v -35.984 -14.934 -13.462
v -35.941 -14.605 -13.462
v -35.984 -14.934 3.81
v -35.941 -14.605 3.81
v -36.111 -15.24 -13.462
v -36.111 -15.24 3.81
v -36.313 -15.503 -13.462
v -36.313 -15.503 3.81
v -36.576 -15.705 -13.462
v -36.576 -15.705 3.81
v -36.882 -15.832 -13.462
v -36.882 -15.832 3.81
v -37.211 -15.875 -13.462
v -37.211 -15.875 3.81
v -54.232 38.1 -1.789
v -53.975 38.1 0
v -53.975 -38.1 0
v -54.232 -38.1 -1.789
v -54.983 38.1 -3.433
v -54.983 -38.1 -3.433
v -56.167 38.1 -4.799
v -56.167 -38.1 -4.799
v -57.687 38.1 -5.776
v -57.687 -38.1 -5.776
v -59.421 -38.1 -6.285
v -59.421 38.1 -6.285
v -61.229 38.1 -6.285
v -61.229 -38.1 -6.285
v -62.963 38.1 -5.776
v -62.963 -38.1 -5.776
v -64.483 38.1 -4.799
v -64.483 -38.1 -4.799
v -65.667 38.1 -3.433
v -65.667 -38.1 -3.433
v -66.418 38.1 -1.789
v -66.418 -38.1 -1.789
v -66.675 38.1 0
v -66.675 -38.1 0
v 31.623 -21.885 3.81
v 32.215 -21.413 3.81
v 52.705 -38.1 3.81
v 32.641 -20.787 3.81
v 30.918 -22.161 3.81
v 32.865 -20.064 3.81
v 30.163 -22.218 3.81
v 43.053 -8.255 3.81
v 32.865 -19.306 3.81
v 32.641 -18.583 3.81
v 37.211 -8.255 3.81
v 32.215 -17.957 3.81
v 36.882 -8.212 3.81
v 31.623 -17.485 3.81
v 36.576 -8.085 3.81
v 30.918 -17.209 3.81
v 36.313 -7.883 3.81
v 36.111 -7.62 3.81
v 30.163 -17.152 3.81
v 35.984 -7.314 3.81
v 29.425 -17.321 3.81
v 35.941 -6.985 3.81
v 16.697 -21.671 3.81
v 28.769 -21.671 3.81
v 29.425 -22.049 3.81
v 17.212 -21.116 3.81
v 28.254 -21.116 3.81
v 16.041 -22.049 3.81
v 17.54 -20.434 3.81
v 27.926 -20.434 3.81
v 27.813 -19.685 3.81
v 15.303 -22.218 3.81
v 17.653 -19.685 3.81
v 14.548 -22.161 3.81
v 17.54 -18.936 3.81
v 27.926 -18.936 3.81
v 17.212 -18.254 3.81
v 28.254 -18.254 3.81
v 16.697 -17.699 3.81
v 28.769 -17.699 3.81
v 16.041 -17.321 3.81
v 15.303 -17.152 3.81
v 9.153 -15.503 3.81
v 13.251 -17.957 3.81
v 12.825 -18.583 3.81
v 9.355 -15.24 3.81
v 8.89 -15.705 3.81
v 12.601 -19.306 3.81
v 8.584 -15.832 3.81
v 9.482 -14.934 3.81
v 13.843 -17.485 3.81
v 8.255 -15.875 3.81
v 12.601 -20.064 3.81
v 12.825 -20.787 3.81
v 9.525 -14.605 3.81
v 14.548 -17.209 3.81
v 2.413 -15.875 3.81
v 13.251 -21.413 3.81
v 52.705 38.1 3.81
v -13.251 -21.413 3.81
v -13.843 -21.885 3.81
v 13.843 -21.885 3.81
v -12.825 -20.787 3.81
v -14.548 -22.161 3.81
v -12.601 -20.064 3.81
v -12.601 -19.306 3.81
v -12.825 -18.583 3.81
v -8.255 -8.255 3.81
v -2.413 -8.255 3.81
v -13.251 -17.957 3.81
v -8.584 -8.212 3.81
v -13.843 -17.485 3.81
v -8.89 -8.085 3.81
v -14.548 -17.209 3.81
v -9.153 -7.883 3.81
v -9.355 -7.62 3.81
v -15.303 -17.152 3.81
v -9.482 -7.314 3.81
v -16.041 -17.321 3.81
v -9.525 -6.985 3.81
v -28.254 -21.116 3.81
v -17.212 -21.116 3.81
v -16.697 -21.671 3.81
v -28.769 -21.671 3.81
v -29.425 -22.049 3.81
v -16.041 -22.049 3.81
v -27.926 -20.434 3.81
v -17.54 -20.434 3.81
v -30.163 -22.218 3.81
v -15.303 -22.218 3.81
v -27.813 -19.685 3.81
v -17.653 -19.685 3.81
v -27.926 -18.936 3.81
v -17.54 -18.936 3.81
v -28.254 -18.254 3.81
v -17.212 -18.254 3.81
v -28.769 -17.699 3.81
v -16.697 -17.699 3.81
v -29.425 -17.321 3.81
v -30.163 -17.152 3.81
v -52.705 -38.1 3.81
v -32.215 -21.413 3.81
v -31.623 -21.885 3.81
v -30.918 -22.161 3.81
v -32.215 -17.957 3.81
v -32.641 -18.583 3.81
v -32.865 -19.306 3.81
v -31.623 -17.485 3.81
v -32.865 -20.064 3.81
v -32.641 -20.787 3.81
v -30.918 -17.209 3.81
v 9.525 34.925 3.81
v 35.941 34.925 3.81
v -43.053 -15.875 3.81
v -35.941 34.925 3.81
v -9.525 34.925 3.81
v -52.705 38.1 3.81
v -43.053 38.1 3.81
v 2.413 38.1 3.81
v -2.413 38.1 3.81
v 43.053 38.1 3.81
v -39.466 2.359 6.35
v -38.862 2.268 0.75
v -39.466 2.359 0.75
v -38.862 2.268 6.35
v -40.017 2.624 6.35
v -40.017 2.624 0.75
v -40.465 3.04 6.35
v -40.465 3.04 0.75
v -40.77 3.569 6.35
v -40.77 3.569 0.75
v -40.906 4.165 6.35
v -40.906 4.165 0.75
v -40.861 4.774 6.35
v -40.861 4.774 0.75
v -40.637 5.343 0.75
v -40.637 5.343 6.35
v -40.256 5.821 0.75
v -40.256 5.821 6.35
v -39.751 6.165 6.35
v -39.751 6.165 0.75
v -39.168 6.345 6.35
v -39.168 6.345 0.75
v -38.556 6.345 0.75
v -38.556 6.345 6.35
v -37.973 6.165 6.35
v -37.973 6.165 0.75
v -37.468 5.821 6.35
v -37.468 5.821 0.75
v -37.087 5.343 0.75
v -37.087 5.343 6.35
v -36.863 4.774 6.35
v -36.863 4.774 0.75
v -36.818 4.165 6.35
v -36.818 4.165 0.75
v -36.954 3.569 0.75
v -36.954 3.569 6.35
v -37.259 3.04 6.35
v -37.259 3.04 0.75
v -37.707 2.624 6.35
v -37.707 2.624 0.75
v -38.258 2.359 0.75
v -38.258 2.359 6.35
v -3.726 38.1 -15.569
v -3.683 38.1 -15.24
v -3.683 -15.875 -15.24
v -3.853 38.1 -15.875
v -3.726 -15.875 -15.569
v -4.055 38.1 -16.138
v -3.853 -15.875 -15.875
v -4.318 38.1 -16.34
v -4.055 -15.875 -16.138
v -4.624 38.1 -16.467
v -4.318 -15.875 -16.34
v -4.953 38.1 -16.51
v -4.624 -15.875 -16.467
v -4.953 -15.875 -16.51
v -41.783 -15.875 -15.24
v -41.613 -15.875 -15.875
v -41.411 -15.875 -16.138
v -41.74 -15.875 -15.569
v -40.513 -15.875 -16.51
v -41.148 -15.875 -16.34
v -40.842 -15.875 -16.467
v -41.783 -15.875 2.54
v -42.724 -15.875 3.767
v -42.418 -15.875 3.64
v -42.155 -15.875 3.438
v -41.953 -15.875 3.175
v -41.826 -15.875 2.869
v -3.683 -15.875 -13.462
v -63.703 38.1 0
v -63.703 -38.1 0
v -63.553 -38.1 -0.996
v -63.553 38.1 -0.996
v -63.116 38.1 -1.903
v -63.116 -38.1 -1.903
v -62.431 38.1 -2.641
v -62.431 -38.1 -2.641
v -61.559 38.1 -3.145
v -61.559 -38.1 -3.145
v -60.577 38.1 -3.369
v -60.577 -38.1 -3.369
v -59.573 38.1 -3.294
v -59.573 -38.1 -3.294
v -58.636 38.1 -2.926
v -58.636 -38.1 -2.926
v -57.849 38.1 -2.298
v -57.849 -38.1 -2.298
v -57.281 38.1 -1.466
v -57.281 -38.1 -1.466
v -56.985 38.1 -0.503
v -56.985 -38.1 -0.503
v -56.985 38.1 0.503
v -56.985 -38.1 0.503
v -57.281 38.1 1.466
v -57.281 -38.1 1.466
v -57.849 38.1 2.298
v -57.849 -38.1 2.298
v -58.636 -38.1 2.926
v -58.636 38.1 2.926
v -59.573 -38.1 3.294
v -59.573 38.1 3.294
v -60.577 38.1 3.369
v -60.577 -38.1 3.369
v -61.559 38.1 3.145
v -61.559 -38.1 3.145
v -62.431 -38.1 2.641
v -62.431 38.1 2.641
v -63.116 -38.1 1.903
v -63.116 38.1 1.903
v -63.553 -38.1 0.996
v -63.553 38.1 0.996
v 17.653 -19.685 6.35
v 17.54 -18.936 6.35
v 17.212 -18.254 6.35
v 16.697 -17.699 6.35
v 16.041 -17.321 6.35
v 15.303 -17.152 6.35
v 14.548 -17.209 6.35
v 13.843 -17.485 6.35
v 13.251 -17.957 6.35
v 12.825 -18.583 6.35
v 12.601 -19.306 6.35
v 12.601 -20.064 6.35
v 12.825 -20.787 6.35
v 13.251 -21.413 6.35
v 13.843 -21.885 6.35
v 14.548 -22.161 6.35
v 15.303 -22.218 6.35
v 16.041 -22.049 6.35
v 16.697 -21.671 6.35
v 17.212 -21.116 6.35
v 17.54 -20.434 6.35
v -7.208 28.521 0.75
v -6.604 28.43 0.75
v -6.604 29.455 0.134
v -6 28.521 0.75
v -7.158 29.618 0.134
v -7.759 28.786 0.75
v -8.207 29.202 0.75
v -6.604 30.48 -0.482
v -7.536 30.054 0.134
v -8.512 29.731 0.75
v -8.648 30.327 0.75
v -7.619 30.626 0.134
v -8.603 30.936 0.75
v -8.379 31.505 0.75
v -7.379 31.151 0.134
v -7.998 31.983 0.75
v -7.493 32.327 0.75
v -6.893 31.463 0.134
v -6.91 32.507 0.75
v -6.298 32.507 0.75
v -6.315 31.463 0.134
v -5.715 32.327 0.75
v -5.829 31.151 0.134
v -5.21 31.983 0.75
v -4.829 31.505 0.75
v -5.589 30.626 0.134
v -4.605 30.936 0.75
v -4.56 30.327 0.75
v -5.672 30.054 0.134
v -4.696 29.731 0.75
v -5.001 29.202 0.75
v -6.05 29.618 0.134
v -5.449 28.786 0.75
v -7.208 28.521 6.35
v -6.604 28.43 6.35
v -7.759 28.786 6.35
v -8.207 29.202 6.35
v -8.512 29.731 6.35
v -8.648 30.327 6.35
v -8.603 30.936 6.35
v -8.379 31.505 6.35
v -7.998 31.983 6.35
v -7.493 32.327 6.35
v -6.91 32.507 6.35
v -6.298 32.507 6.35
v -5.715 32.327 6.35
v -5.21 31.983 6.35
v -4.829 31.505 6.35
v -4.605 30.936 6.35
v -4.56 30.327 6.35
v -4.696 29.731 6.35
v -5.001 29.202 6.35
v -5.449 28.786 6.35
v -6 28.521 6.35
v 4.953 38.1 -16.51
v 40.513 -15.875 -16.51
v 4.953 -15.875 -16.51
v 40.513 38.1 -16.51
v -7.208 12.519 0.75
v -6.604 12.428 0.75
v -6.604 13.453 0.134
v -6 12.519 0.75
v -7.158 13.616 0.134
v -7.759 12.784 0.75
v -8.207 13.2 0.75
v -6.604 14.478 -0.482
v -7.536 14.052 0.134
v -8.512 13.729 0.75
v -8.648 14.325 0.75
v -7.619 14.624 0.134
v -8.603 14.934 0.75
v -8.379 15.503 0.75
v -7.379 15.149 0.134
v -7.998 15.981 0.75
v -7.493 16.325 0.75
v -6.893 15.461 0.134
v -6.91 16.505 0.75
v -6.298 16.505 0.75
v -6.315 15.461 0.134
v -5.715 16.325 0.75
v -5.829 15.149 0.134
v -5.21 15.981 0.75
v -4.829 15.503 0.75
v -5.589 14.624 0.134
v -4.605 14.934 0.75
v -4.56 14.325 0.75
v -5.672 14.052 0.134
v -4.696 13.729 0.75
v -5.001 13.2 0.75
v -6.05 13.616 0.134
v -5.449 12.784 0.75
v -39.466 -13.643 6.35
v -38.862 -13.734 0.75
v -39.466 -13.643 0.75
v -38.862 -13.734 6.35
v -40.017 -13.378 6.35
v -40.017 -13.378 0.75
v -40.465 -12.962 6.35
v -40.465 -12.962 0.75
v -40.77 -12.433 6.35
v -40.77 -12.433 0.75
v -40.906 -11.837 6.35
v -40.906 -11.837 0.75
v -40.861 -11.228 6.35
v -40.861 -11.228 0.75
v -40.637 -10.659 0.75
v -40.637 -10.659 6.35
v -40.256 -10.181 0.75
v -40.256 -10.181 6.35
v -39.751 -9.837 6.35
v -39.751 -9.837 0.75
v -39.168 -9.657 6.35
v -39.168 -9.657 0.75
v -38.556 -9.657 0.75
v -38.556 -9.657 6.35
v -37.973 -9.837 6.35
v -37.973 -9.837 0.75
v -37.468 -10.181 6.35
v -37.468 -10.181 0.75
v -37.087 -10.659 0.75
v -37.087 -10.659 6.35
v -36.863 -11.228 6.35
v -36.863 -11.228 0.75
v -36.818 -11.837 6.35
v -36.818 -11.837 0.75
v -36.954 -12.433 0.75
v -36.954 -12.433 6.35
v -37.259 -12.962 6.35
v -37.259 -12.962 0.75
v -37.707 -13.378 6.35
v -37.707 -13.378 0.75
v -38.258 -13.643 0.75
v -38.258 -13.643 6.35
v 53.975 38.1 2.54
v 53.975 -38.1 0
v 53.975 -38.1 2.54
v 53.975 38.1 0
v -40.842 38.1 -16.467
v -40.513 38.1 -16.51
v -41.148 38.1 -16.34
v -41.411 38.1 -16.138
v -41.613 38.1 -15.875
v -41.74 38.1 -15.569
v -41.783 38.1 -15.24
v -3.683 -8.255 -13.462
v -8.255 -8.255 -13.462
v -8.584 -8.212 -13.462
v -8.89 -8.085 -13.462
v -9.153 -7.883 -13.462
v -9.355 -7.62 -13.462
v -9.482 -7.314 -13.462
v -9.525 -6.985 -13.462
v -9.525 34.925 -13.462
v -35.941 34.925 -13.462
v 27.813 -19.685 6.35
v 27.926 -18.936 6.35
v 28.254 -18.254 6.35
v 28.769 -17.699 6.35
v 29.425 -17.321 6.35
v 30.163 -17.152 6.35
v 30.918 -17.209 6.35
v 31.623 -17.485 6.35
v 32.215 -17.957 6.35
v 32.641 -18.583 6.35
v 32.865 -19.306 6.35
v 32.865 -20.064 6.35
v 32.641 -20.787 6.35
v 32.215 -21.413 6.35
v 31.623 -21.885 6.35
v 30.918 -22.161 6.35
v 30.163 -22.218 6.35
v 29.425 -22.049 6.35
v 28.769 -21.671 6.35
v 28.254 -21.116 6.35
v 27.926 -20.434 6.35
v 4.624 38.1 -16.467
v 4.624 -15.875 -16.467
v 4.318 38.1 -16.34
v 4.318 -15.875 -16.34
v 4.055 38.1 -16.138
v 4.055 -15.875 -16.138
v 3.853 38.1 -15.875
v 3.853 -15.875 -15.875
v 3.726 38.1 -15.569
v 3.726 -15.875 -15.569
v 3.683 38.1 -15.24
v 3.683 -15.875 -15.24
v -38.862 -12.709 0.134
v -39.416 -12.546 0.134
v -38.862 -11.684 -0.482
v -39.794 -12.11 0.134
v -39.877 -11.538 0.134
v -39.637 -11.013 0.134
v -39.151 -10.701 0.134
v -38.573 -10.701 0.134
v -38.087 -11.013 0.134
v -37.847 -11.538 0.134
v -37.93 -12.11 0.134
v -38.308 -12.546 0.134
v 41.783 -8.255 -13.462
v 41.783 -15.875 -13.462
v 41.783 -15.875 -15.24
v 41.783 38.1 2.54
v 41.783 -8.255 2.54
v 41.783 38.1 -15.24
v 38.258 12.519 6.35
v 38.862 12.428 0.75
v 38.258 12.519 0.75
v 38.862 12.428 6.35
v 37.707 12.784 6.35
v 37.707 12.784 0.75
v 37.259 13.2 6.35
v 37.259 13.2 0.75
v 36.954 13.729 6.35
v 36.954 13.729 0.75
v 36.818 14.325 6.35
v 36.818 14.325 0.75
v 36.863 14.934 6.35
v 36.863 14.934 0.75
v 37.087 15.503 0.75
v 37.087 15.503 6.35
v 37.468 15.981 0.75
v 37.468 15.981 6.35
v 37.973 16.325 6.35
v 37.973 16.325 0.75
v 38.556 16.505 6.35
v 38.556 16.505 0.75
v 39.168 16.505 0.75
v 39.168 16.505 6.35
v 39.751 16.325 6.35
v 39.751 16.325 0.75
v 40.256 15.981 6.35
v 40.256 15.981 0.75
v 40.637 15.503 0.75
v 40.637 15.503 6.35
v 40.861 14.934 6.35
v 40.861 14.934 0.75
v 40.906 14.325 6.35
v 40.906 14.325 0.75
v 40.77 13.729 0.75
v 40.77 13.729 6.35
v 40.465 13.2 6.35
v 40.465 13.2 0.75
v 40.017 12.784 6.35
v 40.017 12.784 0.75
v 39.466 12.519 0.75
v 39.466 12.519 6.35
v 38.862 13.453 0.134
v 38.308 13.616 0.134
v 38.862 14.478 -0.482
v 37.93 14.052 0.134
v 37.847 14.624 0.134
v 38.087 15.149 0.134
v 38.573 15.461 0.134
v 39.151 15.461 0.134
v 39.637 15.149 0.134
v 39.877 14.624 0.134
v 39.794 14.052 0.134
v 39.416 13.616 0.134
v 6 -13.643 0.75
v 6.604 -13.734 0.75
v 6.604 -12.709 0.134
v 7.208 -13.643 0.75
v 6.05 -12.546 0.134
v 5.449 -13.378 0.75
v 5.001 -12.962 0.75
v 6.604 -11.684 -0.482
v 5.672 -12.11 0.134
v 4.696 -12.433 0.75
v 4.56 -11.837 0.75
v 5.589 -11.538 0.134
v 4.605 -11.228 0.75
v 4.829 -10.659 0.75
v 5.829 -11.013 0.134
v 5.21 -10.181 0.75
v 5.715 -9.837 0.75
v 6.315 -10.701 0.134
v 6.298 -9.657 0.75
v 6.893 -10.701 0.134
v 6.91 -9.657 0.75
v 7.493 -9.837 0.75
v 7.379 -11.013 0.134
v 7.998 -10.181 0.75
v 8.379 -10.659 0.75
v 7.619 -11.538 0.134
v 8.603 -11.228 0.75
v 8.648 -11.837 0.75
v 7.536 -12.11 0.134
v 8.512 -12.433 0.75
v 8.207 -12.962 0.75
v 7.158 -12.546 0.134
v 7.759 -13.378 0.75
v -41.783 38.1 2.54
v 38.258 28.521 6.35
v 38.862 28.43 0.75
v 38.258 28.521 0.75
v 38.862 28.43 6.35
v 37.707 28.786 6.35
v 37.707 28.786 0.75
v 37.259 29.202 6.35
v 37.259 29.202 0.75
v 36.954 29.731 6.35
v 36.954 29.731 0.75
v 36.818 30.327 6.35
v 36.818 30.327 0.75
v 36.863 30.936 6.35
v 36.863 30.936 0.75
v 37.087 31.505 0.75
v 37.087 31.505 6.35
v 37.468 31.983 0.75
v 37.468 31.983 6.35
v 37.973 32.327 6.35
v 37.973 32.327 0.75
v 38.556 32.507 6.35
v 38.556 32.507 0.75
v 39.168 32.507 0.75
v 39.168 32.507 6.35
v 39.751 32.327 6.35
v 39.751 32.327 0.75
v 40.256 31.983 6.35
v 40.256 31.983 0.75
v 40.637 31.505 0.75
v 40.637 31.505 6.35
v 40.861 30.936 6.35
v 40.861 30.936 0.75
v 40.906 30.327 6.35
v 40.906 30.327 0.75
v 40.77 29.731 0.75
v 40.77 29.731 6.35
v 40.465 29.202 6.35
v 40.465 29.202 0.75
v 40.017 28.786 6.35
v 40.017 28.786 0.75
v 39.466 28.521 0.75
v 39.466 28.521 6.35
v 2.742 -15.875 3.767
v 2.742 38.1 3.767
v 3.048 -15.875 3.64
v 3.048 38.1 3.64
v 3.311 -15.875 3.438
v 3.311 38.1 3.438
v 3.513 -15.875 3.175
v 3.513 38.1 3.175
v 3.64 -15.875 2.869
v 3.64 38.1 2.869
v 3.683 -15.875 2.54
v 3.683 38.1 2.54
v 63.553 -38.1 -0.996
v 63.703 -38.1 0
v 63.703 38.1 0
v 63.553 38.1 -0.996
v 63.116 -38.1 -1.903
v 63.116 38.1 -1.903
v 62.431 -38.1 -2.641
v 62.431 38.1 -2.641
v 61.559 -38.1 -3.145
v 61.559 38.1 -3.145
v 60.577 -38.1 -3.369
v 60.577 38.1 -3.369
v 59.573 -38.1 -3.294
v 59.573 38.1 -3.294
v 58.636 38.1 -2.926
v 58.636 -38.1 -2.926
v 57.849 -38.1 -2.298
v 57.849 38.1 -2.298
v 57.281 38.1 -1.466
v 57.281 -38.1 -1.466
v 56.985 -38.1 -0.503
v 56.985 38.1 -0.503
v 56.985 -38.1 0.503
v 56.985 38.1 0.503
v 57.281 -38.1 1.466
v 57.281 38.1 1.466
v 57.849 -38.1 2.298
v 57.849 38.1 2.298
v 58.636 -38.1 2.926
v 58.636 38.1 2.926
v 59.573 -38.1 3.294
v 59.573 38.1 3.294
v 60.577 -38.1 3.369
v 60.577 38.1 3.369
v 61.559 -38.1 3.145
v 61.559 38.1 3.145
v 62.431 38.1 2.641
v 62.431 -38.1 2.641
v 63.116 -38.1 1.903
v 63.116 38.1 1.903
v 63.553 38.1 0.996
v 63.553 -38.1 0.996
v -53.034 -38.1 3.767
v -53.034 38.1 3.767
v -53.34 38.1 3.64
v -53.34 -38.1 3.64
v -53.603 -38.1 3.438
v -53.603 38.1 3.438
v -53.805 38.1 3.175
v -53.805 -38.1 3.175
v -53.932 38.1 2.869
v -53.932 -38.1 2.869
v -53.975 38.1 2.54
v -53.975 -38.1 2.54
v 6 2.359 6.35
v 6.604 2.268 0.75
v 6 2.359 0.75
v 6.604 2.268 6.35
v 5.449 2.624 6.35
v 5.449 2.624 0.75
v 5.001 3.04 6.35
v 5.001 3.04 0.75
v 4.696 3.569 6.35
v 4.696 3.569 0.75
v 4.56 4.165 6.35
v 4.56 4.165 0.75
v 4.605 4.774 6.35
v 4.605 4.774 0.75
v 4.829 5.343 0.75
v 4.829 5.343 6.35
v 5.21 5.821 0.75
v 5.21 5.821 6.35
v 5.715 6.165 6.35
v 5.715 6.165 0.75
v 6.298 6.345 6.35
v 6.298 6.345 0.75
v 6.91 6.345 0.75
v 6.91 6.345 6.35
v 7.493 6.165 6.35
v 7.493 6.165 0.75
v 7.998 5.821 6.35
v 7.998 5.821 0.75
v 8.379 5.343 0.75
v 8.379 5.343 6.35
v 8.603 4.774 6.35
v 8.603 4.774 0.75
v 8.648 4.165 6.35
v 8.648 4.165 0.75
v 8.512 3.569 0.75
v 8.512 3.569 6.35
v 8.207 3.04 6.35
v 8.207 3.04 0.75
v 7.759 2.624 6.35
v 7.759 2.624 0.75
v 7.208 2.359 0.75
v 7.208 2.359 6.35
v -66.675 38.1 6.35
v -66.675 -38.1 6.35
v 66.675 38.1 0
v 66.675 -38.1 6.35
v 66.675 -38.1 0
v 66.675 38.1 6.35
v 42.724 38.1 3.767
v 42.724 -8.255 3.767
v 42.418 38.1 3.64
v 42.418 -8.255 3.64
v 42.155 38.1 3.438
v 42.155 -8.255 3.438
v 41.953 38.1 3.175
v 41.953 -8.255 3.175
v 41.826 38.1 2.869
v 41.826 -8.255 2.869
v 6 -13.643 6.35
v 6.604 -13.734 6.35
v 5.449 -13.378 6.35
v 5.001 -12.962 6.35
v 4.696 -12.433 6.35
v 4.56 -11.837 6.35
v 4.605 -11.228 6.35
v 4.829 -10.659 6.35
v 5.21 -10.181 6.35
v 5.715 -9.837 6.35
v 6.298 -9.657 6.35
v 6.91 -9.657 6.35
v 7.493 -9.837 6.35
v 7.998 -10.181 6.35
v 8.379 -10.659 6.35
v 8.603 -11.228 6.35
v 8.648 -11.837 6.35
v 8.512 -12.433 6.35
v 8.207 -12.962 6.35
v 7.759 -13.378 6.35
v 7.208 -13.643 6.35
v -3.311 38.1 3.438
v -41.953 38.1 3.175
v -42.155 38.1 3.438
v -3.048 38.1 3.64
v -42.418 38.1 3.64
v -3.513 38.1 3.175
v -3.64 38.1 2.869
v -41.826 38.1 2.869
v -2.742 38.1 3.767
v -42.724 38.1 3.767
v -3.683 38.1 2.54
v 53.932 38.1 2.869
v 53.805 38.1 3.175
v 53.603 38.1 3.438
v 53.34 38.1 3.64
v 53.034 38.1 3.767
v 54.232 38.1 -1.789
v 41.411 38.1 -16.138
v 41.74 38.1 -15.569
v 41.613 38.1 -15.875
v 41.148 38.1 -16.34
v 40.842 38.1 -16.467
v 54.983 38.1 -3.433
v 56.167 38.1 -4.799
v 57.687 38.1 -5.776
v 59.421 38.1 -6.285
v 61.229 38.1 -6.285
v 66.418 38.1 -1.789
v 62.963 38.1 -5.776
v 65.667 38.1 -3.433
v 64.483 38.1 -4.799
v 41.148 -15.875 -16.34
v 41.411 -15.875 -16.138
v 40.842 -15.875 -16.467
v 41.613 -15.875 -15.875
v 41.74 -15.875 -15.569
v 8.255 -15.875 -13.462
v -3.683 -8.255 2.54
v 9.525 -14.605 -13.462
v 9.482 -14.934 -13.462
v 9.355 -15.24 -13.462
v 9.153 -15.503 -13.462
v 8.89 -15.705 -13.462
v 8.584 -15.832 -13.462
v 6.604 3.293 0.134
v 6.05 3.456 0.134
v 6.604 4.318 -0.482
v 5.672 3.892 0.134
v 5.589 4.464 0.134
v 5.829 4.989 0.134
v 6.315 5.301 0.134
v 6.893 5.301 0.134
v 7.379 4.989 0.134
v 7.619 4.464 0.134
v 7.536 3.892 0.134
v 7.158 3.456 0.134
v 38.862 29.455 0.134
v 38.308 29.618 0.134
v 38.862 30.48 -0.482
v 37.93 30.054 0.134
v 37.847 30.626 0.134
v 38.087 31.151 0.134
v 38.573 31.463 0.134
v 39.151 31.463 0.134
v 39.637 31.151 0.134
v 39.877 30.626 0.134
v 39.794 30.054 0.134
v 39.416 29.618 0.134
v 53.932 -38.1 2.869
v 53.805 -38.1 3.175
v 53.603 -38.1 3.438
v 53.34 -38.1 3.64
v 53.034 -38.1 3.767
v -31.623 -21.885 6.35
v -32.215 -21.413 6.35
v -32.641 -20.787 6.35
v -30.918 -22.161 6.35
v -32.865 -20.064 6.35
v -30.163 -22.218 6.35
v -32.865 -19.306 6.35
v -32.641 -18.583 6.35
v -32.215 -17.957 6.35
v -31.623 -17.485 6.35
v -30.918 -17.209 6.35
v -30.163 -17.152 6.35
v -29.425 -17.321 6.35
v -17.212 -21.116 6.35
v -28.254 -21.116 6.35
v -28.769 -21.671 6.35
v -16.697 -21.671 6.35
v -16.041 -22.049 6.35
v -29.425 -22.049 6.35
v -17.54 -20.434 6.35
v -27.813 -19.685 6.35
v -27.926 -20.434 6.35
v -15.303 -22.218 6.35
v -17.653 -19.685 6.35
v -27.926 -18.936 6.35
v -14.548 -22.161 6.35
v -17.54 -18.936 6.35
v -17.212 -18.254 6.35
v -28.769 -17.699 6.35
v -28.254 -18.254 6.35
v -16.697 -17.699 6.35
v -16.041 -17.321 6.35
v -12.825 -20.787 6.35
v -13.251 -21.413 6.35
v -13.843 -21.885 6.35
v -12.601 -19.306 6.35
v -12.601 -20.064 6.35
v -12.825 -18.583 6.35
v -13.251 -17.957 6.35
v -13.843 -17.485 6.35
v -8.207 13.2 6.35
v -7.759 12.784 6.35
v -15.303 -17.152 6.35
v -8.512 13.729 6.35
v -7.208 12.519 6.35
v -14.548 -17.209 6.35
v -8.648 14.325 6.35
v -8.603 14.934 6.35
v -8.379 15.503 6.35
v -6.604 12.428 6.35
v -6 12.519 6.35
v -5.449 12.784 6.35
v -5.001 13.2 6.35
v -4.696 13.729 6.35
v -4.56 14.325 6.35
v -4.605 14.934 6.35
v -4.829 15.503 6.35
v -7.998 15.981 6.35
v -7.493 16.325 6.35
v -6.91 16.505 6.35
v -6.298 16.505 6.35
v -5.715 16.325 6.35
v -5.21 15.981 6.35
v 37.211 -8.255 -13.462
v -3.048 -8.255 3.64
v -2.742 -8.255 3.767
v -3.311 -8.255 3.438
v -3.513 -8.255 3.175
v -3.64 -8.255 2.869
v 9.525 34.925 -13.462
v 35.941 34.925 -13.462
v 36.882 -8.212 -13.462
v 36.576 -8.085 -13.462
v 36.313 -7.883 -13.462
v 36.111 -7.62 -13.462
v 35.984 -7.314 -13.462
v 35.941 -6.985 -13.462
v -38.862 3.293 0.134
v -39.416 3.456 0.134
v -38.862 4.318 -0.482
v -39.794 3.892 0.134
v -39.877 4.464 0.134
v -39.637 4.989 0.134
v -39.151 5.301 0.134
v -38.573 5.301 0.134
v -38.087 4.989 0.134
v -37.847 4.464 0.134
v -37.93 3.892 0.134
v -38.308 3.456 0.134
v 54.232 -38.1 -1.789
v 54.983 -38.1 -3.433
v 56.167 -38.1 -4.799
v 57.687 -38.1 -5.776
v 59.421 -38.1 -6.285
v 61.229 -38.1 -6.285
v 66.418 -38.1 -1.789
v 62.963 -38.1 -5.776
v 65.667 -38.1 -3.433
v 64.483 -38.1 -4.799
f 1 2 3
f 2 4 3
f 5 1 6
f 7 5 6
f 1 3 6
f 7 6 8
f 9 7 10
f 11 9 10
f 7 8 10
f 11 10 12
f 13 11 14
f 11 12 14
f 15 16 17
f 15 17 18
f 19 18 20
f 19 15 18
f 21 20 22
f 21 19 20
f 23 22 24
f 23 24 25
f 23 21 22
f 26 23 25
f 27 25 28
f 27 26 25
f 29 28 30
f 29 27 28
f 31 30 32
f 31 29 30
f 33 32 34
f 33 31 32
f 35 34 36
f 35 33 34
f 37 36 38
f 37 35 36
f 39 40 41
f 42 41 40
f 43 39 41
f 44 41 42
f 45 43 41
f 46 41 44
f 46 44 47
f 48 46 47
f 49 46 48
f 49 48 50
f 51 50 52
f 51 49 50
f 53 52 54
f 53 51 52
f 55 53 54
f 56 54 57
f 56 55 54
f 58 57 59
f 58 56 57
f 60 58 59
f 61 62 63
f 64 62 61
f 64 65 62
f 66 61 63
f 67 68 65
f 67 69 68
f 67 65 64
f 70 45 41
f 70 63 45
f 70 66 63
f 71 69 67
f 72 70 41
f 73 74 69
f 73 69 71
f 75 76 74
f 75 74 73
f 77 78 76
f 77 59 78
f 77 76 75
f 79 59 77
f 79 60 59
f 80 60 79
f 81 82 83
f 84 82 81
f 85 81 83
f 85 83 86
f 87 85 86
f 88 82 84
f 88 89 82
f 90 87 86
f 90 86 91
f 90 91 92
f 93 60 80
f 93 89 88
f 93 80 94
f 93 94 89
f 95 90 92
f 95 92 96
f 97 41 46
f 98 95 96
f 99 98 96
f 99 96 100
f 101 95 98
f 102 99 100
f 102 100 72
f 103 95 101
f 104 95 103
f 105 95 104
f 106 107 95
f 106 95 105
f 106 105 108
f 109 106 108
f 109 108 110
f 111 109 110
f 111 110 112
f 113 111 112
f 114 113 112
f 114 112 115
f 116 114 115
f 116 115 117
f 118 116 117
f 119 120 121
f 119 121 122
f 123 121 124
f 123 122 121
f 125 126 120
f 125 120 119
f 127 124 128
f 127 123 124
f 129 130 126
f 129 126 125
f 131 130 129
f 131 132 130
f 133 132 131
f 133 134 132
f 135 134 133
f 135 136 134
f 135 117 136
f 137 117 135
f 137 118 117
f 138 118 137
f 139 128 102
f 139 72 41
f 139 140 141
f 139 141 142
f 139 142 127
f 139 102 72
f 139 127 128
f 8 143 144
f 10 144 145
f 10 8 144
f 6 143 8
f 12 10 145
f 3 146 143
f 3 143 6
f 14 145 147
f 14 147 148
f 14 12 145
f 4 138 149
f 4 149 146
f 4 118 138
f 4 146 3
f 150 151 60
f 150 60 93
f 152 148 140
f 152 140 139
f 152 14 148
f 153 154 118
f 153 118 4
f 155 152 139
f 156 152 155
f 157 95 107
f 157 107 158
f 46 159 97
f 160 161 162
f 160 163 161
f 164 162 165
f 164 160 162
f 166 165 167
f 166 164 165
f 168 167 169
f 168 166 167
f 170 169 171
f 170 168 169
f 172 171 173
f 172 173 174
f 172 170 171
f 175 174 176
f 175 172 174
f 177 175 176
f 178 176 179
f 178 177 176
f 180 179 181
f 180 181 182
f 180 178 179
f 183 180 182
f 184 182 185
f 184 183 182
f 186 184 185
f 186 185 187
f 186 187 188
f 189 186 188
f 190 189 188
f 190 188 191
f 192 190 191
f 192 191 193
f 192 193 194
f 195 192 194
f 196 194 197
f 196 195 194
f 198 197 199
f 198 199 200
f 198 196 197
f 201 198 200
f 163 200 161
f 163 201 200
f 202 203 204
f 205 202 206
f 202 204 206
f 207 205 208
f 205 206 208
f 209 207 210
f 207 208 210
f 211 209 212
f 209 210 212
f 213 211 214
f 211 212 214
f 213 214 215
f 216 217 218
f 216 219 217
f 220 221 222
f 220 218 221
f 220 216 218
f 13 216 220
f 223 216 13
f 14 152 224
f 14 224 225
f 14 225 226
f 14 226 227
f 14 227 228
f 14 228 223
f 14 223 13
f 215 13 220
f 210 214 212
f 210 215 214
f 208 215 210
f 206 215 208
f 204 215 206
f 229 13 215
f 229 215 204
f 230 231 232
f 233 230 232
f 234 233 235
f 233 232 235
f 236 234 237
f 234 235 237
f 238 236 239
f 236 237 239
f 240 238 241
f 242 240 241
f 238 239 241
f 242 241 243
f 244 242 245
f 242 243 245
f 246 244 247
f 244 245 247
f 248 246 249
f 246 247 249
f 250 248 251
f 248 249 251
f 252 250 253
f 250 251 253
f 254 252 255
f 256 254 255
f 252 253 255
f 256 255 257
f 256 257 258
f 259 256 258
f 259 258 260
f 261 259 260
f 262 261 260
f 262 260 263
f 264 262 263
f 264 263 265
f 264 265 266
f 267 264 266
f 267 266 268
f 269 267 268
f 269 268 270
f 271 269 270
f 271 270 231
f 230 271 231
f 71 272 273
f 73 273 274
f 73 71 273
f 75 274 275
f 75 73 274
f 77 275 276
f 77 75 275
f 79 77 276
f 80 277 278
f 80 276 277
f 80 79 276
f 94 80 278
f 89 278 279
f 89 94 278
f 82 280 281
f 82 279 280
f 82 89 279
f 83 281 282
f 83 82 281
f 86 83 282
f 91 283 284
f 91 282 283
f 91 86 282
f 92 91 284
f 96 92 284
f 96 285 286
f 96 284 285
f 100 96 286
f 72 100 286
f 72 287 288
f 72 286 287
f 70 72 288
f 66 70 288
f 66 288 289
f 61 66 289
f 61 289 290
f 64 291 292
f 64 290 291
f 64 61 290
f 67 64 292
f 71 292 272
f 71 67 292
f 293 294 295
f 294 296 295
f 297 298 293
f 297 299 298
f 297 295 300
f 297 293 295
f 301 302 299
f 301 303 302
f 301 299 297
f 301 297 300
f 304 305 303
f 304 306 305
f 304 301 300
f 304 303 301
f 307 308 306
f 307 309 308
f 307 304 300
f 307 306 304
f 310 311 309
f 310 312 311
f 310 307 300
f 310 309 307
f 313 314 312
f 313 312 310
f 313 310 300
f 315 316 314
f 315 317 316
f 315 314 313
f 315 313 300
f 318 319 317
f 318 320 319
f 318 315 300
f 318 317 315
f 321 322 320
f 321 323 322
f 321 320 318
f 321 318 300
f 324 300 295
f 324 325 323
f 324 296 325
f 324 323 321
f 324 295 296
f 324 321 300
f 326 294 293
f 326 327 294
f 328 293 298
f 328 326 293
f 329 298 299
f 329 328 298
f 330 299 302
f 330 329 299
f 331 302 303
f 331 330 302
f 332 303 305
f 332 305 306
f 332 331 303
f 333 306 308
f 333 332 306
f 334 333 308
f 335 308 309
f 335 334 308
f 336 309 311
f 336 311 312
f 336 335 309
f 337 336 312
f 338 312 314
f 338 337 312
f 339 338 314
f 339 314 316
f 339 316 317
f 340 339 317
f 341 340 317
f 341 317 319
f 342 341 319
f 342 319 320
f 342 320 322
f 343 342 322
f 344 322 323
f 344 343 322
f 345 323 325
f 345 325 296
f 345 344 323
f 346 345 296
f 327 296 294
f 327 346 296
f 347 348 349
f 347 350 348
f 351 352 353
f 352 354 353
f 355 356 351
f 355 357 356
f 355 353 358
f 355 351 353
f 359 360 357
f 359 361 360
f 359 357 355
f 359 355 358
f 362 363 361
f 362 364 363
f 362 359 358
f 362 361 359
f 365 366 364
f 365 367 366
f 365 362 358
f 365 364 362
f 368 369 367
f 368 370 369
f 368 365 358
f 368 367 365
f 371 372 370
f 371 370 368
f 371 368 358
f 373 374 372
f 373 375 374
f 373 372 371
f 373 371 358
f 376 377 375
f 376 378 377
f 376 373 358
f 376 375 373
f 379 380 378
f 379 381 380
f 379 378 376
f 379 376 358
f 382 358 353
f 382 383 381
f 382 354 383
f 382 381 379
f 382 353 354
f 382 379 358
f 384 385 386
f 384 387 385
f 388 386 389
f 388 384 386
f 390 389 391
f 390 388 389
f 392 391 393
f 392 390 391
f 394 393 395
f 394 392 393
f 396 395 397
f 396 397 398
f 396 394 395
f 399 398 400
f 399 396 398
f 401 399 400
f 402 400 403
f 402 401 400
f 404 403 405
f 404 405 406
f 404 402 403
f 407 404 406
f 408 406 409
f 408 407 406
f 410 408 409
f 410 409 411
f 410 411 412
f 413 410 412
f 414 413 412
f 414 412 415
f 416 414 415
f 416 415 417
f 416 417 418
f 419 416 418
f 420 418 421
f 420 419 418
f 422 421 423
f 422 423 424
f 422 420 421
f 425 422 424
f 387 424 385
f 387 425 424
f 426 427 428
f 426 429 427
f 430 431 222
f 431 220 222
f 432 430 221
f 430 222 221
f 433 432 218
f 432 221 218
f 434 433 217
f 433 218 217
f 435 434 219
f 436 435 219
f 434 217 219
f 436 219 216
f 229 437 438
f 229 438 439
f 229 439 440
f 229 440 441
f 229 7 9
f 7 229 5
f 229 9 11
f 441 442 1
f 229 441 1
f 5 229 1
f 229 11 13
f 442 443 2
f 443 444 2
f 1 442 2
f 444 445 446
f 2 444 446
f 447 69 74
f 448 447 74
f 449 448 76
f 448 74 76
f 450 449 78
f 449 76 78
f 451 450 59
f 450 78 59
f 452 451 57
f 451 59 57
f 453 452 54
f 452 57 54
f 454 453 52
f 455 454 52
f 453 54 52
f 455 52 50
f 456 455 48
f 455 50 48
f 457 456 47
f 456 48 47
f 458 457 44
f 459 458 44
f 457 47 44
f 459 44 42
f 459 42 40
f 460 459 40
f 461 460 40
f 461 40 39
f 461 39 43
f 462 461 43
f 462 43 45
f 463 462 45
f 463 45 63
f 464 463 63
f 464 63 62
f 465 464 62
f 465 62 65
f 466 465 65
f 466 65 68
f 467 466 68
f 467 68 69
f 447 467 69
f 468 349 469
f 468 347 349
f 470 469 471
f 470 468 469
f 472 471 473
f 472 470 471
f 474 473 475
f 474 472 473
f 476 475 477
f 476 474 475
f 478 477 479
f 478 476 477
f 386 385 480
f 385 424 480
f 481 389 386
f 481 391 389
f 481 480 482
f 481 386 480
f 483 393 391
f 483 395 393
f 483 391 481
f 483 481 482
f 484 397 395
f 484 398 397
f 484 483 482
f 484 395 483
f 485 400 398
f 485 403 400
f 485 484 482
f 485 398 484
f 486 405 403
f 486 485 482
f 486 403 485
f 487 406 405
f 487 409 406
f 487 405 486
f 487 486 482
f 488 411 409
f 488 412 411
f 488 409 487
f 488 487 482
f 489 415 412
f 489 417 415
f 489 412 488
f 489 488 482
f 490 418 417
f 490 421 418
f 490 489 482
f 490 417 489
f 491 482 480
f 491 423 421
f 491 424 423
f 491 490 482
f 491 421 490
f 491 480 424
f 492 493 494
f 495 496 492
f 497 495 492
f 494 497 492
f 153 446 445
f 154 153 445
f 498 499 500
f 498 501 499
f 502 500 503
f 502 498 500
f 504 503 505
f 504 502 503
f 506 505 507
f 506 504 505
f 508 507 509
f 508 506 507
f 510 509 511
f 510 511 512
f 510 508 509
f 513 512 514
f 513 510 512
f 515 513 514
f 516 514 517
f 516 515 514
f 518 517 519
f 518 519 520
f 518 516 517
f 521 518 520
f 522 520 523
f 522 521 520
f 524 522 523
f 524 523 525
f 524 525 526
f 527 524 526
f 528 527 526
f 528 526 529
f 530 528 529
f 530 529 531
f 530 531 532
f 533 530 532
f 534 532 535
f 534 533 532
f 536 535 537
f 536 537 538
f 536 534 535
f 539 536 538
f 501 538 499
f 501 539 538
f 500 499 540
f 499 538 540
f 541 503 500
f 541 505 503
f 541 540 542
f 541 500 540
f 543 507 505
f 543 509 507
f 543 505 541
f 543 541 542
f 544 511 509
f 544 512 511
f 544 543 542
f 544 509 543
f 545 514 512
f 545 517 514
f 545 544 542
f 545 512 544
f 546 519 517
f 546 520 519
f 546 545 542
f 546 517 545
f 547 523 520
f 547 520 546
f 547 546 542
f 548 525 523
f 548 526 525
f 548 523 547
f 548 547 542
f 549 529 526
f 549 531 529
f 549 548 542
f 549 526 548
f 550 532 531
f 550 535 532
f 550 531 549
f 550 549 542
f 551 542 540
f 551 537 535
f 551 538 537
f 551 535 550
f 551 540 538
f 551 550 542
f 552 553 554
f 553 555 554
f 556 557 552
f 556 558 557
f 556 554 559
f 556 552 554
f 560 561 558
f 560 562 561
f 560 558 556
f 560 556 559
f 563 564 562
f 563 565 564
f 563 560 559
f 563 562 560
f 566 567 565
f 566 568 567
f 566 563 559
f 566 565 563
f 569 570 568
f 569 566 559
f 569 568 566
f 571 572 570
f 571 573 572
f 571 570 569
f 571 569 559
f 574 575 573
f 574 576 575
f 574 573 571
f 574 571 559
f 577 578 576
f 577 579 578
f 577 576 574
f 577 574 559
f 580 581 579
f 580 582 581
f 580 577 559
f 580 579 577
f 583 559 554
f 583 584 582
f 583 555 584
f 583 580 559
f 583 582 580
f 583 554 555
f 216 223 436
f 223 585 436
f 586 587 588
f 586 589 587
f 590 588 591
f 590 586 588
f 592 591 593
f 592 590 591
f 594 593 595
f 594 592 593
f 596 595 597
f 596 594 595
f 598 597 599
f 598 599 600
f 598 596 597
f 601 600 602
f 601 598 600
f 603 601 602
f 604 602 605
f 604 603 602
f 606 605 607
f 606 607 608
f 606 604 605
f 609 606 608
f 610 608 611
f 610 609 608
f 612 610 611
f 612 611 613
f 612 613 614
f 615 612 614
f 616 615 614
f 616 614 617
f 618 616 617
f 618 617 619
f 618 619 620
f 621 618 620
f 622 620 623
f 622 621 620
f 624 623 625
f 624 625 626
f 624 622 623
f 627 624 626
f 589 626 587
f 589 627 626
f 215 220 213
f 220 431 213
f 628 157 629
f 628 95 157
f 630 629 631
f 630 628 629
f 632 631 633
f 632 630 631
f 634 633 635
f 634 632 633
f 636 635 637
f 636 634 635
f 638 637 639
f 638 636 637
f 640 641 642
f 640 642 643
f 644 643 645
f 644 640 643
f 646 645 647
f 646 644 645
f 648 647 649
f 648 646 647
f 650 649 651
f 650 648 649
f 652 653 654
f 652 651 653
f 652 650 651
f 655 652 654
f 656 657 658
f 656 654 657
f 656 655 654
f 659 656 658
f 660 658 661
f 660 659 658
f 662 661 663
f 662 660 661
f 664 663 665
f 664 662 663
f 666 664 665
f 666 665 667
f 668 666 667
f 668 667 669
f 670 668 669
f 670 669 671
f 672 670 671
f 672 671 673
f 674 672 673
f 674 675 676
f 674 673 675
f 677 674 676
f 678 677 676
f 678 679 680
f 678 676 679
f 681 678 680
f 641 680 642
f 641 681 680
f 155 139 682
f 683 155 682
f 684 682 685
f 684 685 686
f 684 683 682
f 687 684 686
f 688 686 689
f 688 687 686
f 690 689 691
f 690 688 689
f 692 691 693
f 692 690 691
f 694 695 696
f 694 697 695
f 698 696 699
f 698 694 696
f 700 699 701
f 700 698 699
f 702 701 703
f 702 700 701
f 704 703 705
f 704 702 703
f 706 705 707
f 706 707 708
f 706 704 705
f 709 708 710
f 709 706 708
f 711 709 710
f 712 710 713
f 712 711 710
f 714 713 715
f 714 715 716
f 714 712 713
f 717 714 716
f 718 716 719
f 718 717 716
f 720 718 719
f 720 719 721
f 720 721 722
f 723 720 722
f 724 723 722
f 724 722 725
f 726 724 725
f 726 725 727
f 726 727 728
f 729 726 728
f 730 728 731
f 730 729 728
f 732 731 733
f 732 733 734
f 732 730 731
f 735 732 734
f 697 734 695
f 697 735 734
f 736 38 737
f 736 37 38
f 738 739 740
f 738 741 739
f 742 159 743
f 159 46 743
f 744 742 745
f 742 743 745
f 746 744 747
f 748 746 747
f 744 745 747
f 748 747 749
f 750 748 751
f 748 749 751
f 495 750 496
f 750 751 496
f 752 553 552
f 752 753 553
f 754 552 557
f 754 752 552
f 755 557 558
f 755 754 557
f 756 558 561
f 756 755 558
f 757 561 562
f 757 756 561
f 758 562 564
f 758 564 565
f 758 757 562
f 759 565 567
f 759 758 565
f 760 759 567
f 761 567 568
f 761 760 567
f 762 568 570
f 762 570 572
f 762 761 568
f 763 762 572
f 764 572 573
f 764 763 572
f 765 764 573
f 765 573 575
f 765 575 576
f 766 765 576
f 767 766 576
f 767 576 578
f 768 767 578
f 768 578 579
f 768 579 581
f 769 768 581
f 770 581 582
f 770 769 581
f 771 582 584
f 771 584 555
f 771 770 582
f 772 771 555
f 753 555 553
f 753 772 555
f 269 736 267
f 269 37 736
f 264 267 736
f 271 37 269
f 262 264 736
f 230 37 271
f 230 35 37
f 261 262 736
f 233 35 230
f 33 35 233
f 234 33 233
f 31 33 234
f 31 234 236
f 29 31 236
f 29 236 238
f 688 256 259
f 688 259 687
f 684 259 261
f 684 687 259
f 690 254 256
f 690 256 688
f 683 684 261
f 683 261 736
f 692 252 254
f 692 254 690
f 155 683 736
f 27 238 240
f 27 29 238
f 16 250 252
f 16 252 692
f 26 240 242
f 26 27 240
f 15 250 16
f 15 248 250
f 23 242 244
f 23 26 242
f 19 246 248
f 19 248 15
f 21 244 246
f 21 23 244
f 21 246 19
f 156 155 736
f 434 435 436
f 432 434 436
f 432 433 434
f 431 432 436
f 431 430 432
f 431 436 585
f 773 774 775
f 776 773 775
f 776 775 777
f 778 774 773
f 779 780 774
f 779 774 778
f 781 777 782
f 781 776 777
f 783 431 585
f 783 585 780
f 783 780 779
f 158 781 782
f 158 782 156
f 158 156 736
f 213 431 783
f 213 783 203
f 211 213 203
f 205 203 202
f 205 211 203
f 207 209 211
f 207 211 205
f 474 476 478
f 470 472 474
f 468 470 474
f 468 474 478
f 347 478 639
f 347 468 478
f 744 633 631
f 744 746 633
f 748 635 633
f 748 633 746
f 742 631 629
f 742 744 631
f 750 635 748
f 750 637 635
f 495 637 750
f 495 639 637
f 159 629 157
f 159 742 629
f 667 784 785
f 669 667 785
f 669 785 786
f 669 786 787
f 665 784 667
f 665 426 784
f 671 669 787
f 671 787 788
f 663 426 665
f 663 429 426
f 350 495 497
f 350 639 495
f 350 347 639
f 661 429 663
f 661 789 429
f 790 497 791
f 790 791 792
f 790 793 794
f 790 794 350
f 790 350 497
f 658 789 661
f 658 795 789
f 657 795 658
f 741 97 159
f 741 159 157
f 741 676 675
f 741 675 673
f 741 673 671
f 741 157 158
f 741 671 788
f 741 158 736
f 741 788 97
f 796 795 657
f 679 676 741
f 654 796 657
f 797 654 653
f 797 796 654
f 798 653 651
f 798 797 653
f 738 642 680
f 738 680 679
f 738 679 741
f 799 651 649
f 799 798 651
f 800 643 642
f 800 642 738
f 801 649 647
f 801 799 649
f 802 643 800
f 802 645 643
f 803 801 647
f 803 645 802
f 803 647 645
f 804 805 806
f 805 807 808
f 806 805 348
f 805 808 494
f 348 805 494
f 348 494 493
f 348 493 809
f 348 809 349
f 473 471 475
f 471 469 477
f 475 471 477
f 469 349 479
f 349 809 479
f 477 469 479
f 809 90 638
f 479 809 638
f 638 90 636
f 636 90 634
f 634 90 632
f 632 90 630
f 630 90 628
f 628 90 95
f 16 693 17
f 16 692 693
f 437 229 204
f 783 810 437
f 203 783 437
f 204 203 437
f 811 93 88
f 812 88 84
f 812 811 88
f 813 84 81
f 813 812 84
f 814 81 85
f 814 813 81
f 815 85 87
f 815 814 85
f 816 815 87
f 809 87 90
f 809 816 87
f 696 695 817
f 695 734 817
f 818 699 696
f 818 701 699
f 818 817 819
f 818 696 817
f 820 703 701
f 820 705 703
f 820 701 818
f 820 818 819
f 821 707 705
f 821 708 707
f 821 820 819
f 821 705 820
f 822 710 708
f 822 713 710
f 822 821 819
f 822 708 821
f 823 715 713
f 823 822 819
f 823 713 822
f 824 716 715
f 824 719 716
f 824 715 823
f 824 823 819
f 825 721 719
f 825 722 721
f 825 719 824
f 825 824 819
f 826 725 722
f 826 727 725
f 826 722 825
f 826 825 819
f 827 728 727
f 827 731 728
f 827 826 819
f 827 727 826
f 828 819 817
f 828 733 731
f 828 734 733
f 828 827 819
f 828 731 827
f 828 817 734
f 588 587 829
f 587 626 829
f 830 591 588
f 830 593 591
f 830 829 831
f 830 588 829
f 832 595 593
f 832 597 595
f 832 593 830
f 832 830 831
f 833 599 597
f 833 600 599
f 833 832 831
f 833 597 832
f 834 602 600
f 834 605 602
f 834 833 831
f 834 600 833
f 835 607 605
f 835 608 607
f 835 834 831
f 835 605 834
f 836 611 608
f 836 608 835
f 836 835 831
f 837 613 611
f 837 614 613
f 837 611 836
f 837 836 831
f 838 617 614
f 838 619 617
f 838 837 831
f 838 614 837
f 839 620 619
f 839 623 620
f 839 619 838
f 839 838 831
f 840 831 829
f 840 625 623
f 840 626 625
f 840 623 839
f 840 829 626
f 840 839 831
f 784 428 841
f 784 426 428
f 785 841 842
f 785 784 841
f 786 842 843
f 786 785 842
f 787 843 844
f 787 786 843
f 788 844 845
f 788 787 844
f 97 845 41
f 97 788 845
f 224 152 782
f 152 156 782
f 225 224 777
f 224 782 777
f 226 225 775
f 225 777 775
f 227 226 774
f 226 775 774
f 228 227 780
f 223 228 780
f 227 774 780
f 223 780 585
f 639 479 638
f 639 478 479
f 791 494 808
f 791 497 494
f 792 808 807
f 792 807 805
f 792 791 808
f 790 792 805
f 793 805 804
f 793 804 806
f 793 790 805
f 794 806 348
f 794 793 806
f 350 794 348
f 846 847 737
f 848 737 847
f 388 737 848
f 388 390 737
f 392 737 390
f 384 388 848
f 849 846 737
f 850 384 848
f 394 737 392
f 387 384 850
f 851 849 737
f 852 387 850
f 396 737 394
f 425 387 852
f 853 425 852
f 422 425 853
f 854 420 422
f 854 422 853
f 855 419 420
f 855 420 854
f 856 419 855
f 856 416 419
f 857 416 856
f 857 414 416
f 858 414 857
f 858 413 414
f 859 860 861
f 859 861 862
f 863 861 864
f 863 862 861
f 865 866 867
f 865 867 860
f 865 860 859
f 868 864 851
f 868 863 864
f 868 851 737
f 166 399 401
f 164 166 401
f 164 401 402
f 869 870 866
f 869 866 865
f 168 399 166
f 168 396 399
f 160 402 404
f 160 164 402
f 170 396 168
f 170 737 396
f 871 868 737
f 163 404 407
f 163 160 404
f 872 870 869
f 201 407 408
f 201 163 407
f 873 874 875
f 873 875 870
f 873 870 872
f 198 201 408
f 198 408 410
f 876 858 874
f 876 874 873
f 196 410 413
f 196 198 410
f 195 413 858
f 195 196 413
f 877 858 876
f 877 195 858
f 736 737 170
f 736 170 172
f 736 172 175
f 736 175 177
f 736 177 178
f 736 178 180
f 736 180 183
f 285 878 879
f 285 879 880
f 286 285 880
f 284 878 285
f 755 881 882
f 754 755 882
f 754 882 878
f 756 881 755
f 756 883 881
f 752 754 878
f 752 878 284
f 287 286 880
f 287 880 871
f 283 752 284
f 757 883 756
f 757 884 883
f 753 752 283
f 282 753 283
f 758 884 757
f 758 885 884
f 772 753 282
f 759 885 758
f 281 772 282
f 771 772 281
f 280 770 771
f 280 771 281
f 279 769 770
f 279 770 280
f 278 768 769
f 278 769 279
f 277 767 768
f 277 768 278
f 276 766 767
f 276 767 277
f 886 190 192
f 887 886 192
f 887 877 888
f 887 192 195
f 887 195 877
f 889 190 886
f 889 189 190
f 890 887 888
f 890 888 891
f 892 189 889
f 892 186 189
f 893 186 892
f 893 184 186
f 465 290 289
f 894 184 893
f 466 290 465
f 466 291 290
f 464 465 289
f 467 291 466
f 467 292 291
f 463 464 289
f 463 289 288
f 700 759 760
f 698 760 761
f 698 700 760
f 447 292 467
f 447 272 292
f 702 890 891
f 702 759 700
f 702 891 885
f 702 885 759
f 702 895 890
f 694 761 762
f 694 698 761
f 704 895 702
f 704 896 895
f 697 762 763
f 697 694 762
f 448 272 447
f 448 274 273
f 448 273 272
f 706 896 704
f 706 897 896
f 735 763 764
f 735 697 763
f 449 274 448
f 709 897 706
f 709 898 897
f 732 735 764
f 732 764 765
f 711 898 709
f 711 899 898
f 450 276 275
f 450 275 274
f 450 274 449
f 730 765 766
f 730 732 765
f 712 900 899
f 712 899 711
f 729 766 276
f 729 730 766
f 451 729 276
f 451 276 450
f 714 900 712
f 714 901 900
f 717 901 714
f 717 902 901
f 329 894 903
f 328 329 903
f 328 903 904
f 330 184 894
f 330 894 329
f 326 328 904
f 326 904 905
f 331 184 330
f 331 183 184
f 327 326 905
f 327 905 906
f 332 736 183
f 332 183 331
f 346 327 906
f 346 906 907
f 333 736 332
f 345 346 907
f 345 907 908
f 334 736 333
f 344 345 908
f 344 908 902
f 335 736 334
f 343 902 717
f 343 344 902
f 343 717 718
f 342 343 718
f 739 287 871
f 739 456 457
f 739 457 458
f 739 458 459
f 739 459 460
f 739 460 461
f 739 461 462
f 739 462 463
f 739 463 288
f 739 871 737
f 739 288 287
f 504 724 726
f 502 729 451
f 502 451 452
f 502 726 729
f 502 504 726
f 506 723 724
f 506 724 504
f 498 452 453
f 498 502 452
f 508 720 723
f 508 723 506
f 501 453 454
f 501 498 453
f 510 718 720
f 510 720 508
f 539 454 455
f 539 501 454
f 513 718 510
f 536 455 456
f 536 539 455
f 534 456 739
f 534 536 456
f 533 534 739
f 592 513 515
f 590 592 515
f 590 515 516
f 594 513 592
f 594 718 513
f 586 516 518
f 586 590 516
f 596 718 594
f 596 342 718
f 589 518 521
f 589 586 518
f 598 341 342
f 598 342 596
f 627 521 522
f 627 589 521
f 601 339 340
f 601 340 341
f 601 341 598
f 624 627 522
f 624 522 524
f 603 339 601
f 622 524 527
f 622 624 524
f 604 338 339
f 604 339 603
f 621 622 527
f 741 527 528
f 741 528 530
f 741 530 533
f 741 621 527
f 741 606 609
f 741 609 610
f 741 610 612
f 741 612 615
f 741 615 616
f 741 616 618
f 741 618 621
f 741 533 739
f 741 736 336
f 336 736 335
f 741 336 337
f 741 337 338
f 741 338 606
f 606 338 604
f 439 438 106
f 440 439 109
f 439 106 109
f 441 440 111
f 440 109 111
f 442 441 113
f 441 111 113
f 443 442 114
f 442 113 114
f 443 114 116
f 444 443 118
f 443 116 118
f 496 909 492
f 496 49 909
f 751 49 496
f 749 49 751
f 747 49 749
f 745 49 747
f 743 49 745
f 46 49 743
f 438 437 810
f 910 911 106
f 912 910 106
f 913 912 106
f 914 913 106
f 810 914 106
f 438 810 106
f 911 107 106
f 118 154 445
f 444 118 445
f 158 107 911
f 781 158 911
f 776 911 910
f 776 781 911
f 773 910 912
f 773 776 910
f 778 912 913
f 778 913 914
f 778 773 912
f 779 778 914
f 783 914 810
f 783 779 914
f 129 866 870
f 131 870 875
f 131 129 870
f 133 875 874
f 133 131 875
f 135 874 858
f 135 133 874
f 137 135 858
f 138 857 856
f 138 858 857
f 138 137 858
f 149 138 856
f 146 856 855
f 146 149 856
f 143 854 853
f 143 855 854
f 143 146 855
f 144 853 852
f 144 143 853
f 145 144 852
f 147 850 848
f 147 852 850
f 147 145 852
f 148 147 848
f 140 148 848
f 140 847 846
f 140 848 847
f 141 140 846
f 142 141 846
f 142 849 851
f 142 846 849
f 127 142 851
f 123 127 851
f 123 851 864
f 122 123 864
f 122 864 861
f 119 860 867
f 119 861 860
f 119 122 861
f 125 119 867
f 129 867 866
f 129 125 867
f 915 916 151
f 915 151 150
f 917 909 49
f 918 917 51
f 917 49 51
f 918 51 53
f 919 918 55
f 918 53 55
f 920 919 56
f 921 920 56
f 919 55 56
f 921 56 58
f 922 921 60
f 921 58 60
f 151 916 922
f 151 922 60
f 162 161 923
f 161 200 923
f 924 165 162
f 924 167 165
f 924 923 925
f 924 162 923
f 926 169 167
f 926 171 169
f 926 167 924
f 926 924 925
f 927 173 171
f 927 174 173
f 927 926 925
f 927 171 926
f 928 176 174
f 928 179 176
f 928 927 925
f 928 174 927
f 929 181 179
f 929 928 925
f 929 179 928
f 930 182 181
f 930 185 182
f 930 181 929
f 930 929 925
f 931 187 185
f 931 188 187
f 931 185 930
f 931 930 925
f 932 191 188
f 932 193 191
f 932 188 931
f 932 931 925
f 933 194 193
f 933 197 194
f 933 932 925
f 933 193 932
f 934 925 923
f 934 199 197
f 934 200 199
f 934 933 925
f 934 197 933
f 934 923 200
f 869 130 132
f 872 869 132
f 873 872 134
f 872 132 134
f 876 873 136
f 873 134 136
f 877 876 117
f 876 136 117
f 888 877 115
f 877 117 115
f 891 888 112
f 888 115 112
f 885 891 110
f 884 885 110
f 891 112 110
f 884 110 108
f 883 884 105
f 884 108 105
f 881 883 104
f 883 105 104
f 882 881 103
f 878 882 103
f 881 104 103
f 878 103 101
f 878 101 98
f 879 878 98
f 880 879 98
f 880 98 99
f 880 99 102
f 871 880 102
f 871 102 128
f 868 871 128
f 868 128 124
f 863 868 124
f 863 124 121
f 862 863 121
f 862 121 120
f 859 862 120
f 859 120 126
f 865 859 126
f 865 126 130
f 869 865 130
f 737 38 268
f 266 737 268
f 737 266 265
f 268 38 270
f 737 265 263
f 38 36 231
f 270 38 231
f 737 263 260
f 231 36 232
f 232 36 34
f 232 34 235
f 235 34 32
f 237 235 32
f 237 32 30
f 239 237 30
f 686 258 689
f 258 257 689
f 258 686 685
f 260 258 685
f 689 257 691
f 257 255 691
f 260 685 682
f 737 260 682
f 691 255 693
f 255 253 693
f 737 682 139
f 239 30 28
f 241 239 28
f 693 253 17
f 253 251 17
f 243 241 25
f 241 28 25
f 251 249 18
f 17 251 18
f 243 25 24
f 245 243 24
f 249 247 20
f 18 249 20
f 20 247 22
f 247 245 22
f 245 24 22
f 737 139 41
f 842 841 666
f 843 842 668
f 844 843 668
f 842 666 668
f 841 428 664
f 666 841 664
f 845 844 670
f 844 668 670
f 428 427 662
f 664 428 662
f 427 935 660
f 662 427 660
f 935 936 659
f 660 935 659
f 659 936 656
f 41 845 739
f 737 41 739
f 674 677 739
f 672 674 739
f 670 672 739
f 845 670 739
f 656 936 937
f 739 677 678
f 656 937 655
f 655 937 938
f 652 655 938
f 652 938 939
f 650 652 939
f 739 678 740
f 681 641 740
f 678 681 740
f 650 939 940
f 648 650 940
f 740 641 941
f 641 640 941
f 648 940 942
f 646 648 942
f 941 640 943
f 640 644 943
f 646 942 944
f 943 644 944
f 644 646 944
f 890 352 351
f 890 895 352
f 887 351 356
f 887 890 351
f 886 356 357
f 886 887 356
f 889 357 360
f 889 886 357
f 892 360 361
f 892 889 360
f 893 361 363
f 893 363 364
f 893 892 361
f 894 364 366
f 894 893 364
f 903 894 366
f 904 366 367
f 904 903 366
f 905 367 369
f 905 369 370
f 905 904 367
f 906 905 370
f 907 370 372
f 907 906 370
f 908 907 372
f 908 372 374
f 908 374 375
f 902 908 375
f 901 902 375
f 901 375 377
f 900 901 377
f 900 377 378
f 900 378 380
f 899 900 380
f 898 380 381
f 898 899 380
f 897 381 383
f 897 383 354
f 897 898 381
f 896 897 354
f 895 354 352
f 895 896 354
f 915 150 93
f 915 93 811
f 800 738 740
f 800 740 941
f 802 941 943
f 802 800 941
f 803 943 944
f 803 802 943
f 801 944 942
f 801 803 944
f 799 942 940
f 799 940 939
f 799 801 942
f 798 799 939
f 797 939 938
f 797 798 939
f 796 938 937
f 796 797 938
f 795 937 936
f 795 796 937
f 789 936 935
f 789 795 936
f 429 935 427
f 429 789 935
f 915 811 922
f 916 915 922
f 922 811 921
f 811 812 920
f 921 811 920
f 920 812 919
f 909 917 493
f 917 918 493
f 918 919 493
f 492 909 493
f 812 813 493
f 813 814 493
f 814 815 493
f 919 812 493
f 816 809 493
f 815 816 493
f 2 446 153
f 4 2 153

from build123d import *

# Parameters (mm, degrees)
BOSS_EXTRUDE1_DEPTH     = 38.1
F_1_4_CLEARANCE_HOLE1_D = 6.7564
FILLET1_R               = 1.27
SKETCH23_W              = 38.1
SKETCH23_H              = 20.32
BOSS_EXTRUDE2_DEPTH     = 3.175
BOSS_EXTRUDE3_DEPTH     = 50.8
LPATTERN1_COUNT         = 2
LPATTERN1_PITCH         = 45.466
LPATTERN1_COUNT_DIR2    = 2
LPATTERN1_PITCH_DIR2    = 16.002
LPATTERN2_COUNT         = 2
LPATTERN2_PITCH         = 45.466
LPATTERN2_COUNT_DIR2    = 2
LPATTERN2_PITCH_DIR2    = 16.002
SKETCH33_R              = 2.54
CUT_EXTRUDE1_DEPTH      = 80.435936609
MIRROR7_COPY_1_SKETCH_R = 2.54
MIRROR7_COPY_1_DEPTH    = 80.435936609
SKETCH37_W              = 5.842
SKETCH37_H              = 17.272
CUT_EXTRUDE4_DEPTH      = 7.62
FILLET2_R               = 1.27


with BuildPart() as part:
    # Sketch1 → Boss-Extrude1 (new, symmetric)
    with BuildSketch(Plane(origin=(0, 0, 0), x_dir=(1, 0, 0), z_dir=(0, 1, 0))):
        with BuildLine():
            Line((0, -6.35), (66.675, -6.35))
            Line((66.675, -6.35), (66.675, 0))
            ThreePointArc((66.675, 0), (60.324997065, 6.349997065), (53.975, -5.869e-06))
            Line((53.975, -5.869e-06), (53.975, -3.81))
            Line((53.975, -3.81), (-53.975, -3.81))
            Line((-53.975, -3.81), (-53.975, 0))
            ThreePointArc((-53.975, 0), (-60.325, 6.35), (-66.675, 0))
            Line((-66.675, 0), (-66.675, -6.35))
            Line((-66.675, -6.35), (0, -6.35))
        make_face()
    extrude(amount=BOSS_EXTRUDE1_DEPTH, both=True)

    # 1/4 Clearance Hole1 (through all)
    with Locations(Plane(origin=(0, 38.1, 0), x_dir=(1, 0, 0), z_dir=(0, 1, 0))):
        with Locations((-60.325, 0)):
            f_1_4_clearance_hole1 = Hole(F_1_4_CLEARANCE_HOLE1_D / 2)

    # Mirror4: 1/4 Clearance Hole1 across plane
    add(f_1_4_clearance_hole1.mirror(Plane(origin=(0, 0, 0), x_dir=(0, 0, 1), z_dir=(1, 0, 0))), mode=Mode.SUBTRACT)

    # Fillet1
    fillet1_edges = [part.edges().sort_by_distance(p)[0] for p in [
        (-53.975, 0, 3.81),
        (53.975, 0, 3.81),
    ]]
    fillet(fillet1_edges, radius=FILLET1_R)

    # Sketch23 → Boss-Extrude2 (add)
    with BuildSketch(Plane(origin=(0, 38.1, 0), x_dir=(1, 0, 0), z_dir=(0, 1, 0))):
        with Locations((-22.733, 6.35)):
            Rectangle(SKETCH23_W, SKETCH23_H)
    boss_extrude2 = extrude(amount=-BOSS_EXTRUDE2_DEPTH)

    # Sketch24 → Boss-Extrude3 (add)
    with BuildSketch(Plane.XZ.offset(-34.925)):
        Polygon((-35.941, 3.81), (-41.783, 3.81), (-41.783, -16.51), (-22.733, -16.51), (-22.733, -13.462), (-35.941, -13.462), align=None)
        Polygon((-22.733, -13.462), (-22.733, -16.51), (-3.683, -16.51), (-3.683, 3.81), (-9.525, 3.81), (-9.525, -13.462), align=None)
    boss_extrude3 = extrude(amount=BOSS_EXTRUDE3_DEPTH)

    # Mirror5: Boss-Extrude2, Boss-Extrude3 across plane
    add(boss_extrude2.mirror(Plane(origin=(0, 0, 0), x_dir=(0, 0, 1), z_dir=(1, 0, 0))))
    add(boss_extrude3.mirror(Plane(origin=(0, 0, 0), x_dir=(0, 0, 1), z_dir=(1, 0, 0))))

    # Sketch30 → Ø1.0 mm Dowel Holes1 (revolve, cut)
    with BuildSketch(Plane(origin=(-6.604, 30.48, 6.35), x_dir=(0, -1, 0), z_dir=(1, 0, 0))):
        Polygon((0, 0), (0, 6.831753069), (2.05, 5.5999888), (2.05, 0), align=None)
    f_1_0_mm_dowel_holes1 = revolve(axis=Axis((-6.604, 30.48, 12.7), (0, 0, -1)), mode=Mode.SUBTRACT)

    # LPattern1: 1.0 mm Dowel Holes1 2 × 2
    with Locations(*[(i * LPATTERN1_PITCH, -j * LPATTERN1_PITCH_DIR2, 0) for i in range(LPATTERN1_COUNT) for j in range(LPATTERN1_COUNT_DIR2) if (i, j) != (0, 0)]):
        add(f_1_0_mm_dowel_holes1, mode=Mode.SUBTRACT)

    # Sketch32 → Ø1.0 mm Dowel Holes2 (revolve, cut)
    with BuildSketch(Plane(origin=(6.604, 4.318, 6.35), x_dir=(0, -1, 0), z_dir=(1, 0, 0))):
        Polygon((0, 0), (0, 6.831753069), (2.05, 5.5999888), (2.05, 0), align=None)
    f_1_0_mm_dowel_holes2 = revolve(axis=Axis((6.604, 4.318, 12.7), (0, 0, -1)), mode=Mode.SUBTRACT)

    # LPattern2: 1.0 mm Dowel Holes2 2 × 2
    with Locations(*[(-i * LPATTERN2_PITCH, -j * LPATTERN2_PITCH_DIR2, 0) for i in range(LPATTERN2_COUNT) for j in range(LPATTERN2_COUNT_DIR2) if (i, j) != (0, 0)]):
        add(f_1_0_mm_dowel_holes2, mode=Mode.SUBTRACT)

    # Sketch33 → Cut-Extrude1 (cut, through all)
    with BuildSketch(Plane(origin=(0, 0, 3.81), x_dir=(-1, 0, 0), z_dir=(0, 0, -1))):
        with Locations((-30.353, -19.685)):
            Circle(SKETCH33_R)
    cut_extrude1 = extrude(amount=-CUT_EXTRUDE1_DEPTH, mode=Mode.SUBTRACT)

    # Mirror6: Cut-Extrude1 across plane
    add(cut_extrude1.mirror(Plane.ZY.offset(-22.733)), mode=Mode.SUBTRACT)

    # Mirror7: Cut-Extrude1 across plane
    add(cut_extrude1.mirror(Plane(origin=(0, 0, 0), x_dir=(0, 0, 1), z_dir=(1, 0, 0))), mode=Mode.SUBTRACT)

    # Mirror7 copy 1 sketch → Mirror7 copy 1 (cut, through all)
    with BuildSketch(Plane(origin=(-45.466, 0, 3.81), x_dir=(-1, 0, 0), z_dir=(0, 0, -1))):
        with Locations((-30.353, -19.685)):
            Circle(MIRROR7_COPY_1_SKETCH_R)
    extrude(amount=-MIRROR7_COPY_1_DEPTH, mode=Mode.SUBTRACT)

    # Sketch37 → Cut-Extrude4 (cut)
    with BuildSketch(Plane.XZ.offset(15.875)):
        with Locations((38.862, -4.826)):
            Rectangle(SKETCH37_W, SKETCH37_H)
    cut_extrude4 = extrude(amount=-CUT_EXTRUDE4_DEPTH, mode=Mode.SUBTRACT)

    # Mirror11: Cut-Extrude4 across plane
    add(cut_extrude4.mirror(Plane.ZY.offset(-16.129)), mode=Mode.SUBTRACT)

    # Fillet2
    fillet2_edges = [part.edges().sort_by_distance(p)[0] for p in [
        (9.525, -15.875, -4.826),
        (41.783, 14.9225, 3.81),
        (35.941, -8.255, -4.826),
        (-3.683, 14.9225, 3.81),
        (-9.525, -8.255, -4.826),
        (-41.783, 11.1125, 3.81),
        (-41.783, 11.1125, -16.51),
        (-3.683, 11.1125, -16.51),
        (-35.941, -15.875, -4.826),
        (41.783, 11.1125, -16.51),
        (3.683, 11.1125, 3.81),
        (3.683, 11.1125, -16.51),
    ]]
    fillet(fillet2_edges, radius=FILLET2_R)


solid = part.part
